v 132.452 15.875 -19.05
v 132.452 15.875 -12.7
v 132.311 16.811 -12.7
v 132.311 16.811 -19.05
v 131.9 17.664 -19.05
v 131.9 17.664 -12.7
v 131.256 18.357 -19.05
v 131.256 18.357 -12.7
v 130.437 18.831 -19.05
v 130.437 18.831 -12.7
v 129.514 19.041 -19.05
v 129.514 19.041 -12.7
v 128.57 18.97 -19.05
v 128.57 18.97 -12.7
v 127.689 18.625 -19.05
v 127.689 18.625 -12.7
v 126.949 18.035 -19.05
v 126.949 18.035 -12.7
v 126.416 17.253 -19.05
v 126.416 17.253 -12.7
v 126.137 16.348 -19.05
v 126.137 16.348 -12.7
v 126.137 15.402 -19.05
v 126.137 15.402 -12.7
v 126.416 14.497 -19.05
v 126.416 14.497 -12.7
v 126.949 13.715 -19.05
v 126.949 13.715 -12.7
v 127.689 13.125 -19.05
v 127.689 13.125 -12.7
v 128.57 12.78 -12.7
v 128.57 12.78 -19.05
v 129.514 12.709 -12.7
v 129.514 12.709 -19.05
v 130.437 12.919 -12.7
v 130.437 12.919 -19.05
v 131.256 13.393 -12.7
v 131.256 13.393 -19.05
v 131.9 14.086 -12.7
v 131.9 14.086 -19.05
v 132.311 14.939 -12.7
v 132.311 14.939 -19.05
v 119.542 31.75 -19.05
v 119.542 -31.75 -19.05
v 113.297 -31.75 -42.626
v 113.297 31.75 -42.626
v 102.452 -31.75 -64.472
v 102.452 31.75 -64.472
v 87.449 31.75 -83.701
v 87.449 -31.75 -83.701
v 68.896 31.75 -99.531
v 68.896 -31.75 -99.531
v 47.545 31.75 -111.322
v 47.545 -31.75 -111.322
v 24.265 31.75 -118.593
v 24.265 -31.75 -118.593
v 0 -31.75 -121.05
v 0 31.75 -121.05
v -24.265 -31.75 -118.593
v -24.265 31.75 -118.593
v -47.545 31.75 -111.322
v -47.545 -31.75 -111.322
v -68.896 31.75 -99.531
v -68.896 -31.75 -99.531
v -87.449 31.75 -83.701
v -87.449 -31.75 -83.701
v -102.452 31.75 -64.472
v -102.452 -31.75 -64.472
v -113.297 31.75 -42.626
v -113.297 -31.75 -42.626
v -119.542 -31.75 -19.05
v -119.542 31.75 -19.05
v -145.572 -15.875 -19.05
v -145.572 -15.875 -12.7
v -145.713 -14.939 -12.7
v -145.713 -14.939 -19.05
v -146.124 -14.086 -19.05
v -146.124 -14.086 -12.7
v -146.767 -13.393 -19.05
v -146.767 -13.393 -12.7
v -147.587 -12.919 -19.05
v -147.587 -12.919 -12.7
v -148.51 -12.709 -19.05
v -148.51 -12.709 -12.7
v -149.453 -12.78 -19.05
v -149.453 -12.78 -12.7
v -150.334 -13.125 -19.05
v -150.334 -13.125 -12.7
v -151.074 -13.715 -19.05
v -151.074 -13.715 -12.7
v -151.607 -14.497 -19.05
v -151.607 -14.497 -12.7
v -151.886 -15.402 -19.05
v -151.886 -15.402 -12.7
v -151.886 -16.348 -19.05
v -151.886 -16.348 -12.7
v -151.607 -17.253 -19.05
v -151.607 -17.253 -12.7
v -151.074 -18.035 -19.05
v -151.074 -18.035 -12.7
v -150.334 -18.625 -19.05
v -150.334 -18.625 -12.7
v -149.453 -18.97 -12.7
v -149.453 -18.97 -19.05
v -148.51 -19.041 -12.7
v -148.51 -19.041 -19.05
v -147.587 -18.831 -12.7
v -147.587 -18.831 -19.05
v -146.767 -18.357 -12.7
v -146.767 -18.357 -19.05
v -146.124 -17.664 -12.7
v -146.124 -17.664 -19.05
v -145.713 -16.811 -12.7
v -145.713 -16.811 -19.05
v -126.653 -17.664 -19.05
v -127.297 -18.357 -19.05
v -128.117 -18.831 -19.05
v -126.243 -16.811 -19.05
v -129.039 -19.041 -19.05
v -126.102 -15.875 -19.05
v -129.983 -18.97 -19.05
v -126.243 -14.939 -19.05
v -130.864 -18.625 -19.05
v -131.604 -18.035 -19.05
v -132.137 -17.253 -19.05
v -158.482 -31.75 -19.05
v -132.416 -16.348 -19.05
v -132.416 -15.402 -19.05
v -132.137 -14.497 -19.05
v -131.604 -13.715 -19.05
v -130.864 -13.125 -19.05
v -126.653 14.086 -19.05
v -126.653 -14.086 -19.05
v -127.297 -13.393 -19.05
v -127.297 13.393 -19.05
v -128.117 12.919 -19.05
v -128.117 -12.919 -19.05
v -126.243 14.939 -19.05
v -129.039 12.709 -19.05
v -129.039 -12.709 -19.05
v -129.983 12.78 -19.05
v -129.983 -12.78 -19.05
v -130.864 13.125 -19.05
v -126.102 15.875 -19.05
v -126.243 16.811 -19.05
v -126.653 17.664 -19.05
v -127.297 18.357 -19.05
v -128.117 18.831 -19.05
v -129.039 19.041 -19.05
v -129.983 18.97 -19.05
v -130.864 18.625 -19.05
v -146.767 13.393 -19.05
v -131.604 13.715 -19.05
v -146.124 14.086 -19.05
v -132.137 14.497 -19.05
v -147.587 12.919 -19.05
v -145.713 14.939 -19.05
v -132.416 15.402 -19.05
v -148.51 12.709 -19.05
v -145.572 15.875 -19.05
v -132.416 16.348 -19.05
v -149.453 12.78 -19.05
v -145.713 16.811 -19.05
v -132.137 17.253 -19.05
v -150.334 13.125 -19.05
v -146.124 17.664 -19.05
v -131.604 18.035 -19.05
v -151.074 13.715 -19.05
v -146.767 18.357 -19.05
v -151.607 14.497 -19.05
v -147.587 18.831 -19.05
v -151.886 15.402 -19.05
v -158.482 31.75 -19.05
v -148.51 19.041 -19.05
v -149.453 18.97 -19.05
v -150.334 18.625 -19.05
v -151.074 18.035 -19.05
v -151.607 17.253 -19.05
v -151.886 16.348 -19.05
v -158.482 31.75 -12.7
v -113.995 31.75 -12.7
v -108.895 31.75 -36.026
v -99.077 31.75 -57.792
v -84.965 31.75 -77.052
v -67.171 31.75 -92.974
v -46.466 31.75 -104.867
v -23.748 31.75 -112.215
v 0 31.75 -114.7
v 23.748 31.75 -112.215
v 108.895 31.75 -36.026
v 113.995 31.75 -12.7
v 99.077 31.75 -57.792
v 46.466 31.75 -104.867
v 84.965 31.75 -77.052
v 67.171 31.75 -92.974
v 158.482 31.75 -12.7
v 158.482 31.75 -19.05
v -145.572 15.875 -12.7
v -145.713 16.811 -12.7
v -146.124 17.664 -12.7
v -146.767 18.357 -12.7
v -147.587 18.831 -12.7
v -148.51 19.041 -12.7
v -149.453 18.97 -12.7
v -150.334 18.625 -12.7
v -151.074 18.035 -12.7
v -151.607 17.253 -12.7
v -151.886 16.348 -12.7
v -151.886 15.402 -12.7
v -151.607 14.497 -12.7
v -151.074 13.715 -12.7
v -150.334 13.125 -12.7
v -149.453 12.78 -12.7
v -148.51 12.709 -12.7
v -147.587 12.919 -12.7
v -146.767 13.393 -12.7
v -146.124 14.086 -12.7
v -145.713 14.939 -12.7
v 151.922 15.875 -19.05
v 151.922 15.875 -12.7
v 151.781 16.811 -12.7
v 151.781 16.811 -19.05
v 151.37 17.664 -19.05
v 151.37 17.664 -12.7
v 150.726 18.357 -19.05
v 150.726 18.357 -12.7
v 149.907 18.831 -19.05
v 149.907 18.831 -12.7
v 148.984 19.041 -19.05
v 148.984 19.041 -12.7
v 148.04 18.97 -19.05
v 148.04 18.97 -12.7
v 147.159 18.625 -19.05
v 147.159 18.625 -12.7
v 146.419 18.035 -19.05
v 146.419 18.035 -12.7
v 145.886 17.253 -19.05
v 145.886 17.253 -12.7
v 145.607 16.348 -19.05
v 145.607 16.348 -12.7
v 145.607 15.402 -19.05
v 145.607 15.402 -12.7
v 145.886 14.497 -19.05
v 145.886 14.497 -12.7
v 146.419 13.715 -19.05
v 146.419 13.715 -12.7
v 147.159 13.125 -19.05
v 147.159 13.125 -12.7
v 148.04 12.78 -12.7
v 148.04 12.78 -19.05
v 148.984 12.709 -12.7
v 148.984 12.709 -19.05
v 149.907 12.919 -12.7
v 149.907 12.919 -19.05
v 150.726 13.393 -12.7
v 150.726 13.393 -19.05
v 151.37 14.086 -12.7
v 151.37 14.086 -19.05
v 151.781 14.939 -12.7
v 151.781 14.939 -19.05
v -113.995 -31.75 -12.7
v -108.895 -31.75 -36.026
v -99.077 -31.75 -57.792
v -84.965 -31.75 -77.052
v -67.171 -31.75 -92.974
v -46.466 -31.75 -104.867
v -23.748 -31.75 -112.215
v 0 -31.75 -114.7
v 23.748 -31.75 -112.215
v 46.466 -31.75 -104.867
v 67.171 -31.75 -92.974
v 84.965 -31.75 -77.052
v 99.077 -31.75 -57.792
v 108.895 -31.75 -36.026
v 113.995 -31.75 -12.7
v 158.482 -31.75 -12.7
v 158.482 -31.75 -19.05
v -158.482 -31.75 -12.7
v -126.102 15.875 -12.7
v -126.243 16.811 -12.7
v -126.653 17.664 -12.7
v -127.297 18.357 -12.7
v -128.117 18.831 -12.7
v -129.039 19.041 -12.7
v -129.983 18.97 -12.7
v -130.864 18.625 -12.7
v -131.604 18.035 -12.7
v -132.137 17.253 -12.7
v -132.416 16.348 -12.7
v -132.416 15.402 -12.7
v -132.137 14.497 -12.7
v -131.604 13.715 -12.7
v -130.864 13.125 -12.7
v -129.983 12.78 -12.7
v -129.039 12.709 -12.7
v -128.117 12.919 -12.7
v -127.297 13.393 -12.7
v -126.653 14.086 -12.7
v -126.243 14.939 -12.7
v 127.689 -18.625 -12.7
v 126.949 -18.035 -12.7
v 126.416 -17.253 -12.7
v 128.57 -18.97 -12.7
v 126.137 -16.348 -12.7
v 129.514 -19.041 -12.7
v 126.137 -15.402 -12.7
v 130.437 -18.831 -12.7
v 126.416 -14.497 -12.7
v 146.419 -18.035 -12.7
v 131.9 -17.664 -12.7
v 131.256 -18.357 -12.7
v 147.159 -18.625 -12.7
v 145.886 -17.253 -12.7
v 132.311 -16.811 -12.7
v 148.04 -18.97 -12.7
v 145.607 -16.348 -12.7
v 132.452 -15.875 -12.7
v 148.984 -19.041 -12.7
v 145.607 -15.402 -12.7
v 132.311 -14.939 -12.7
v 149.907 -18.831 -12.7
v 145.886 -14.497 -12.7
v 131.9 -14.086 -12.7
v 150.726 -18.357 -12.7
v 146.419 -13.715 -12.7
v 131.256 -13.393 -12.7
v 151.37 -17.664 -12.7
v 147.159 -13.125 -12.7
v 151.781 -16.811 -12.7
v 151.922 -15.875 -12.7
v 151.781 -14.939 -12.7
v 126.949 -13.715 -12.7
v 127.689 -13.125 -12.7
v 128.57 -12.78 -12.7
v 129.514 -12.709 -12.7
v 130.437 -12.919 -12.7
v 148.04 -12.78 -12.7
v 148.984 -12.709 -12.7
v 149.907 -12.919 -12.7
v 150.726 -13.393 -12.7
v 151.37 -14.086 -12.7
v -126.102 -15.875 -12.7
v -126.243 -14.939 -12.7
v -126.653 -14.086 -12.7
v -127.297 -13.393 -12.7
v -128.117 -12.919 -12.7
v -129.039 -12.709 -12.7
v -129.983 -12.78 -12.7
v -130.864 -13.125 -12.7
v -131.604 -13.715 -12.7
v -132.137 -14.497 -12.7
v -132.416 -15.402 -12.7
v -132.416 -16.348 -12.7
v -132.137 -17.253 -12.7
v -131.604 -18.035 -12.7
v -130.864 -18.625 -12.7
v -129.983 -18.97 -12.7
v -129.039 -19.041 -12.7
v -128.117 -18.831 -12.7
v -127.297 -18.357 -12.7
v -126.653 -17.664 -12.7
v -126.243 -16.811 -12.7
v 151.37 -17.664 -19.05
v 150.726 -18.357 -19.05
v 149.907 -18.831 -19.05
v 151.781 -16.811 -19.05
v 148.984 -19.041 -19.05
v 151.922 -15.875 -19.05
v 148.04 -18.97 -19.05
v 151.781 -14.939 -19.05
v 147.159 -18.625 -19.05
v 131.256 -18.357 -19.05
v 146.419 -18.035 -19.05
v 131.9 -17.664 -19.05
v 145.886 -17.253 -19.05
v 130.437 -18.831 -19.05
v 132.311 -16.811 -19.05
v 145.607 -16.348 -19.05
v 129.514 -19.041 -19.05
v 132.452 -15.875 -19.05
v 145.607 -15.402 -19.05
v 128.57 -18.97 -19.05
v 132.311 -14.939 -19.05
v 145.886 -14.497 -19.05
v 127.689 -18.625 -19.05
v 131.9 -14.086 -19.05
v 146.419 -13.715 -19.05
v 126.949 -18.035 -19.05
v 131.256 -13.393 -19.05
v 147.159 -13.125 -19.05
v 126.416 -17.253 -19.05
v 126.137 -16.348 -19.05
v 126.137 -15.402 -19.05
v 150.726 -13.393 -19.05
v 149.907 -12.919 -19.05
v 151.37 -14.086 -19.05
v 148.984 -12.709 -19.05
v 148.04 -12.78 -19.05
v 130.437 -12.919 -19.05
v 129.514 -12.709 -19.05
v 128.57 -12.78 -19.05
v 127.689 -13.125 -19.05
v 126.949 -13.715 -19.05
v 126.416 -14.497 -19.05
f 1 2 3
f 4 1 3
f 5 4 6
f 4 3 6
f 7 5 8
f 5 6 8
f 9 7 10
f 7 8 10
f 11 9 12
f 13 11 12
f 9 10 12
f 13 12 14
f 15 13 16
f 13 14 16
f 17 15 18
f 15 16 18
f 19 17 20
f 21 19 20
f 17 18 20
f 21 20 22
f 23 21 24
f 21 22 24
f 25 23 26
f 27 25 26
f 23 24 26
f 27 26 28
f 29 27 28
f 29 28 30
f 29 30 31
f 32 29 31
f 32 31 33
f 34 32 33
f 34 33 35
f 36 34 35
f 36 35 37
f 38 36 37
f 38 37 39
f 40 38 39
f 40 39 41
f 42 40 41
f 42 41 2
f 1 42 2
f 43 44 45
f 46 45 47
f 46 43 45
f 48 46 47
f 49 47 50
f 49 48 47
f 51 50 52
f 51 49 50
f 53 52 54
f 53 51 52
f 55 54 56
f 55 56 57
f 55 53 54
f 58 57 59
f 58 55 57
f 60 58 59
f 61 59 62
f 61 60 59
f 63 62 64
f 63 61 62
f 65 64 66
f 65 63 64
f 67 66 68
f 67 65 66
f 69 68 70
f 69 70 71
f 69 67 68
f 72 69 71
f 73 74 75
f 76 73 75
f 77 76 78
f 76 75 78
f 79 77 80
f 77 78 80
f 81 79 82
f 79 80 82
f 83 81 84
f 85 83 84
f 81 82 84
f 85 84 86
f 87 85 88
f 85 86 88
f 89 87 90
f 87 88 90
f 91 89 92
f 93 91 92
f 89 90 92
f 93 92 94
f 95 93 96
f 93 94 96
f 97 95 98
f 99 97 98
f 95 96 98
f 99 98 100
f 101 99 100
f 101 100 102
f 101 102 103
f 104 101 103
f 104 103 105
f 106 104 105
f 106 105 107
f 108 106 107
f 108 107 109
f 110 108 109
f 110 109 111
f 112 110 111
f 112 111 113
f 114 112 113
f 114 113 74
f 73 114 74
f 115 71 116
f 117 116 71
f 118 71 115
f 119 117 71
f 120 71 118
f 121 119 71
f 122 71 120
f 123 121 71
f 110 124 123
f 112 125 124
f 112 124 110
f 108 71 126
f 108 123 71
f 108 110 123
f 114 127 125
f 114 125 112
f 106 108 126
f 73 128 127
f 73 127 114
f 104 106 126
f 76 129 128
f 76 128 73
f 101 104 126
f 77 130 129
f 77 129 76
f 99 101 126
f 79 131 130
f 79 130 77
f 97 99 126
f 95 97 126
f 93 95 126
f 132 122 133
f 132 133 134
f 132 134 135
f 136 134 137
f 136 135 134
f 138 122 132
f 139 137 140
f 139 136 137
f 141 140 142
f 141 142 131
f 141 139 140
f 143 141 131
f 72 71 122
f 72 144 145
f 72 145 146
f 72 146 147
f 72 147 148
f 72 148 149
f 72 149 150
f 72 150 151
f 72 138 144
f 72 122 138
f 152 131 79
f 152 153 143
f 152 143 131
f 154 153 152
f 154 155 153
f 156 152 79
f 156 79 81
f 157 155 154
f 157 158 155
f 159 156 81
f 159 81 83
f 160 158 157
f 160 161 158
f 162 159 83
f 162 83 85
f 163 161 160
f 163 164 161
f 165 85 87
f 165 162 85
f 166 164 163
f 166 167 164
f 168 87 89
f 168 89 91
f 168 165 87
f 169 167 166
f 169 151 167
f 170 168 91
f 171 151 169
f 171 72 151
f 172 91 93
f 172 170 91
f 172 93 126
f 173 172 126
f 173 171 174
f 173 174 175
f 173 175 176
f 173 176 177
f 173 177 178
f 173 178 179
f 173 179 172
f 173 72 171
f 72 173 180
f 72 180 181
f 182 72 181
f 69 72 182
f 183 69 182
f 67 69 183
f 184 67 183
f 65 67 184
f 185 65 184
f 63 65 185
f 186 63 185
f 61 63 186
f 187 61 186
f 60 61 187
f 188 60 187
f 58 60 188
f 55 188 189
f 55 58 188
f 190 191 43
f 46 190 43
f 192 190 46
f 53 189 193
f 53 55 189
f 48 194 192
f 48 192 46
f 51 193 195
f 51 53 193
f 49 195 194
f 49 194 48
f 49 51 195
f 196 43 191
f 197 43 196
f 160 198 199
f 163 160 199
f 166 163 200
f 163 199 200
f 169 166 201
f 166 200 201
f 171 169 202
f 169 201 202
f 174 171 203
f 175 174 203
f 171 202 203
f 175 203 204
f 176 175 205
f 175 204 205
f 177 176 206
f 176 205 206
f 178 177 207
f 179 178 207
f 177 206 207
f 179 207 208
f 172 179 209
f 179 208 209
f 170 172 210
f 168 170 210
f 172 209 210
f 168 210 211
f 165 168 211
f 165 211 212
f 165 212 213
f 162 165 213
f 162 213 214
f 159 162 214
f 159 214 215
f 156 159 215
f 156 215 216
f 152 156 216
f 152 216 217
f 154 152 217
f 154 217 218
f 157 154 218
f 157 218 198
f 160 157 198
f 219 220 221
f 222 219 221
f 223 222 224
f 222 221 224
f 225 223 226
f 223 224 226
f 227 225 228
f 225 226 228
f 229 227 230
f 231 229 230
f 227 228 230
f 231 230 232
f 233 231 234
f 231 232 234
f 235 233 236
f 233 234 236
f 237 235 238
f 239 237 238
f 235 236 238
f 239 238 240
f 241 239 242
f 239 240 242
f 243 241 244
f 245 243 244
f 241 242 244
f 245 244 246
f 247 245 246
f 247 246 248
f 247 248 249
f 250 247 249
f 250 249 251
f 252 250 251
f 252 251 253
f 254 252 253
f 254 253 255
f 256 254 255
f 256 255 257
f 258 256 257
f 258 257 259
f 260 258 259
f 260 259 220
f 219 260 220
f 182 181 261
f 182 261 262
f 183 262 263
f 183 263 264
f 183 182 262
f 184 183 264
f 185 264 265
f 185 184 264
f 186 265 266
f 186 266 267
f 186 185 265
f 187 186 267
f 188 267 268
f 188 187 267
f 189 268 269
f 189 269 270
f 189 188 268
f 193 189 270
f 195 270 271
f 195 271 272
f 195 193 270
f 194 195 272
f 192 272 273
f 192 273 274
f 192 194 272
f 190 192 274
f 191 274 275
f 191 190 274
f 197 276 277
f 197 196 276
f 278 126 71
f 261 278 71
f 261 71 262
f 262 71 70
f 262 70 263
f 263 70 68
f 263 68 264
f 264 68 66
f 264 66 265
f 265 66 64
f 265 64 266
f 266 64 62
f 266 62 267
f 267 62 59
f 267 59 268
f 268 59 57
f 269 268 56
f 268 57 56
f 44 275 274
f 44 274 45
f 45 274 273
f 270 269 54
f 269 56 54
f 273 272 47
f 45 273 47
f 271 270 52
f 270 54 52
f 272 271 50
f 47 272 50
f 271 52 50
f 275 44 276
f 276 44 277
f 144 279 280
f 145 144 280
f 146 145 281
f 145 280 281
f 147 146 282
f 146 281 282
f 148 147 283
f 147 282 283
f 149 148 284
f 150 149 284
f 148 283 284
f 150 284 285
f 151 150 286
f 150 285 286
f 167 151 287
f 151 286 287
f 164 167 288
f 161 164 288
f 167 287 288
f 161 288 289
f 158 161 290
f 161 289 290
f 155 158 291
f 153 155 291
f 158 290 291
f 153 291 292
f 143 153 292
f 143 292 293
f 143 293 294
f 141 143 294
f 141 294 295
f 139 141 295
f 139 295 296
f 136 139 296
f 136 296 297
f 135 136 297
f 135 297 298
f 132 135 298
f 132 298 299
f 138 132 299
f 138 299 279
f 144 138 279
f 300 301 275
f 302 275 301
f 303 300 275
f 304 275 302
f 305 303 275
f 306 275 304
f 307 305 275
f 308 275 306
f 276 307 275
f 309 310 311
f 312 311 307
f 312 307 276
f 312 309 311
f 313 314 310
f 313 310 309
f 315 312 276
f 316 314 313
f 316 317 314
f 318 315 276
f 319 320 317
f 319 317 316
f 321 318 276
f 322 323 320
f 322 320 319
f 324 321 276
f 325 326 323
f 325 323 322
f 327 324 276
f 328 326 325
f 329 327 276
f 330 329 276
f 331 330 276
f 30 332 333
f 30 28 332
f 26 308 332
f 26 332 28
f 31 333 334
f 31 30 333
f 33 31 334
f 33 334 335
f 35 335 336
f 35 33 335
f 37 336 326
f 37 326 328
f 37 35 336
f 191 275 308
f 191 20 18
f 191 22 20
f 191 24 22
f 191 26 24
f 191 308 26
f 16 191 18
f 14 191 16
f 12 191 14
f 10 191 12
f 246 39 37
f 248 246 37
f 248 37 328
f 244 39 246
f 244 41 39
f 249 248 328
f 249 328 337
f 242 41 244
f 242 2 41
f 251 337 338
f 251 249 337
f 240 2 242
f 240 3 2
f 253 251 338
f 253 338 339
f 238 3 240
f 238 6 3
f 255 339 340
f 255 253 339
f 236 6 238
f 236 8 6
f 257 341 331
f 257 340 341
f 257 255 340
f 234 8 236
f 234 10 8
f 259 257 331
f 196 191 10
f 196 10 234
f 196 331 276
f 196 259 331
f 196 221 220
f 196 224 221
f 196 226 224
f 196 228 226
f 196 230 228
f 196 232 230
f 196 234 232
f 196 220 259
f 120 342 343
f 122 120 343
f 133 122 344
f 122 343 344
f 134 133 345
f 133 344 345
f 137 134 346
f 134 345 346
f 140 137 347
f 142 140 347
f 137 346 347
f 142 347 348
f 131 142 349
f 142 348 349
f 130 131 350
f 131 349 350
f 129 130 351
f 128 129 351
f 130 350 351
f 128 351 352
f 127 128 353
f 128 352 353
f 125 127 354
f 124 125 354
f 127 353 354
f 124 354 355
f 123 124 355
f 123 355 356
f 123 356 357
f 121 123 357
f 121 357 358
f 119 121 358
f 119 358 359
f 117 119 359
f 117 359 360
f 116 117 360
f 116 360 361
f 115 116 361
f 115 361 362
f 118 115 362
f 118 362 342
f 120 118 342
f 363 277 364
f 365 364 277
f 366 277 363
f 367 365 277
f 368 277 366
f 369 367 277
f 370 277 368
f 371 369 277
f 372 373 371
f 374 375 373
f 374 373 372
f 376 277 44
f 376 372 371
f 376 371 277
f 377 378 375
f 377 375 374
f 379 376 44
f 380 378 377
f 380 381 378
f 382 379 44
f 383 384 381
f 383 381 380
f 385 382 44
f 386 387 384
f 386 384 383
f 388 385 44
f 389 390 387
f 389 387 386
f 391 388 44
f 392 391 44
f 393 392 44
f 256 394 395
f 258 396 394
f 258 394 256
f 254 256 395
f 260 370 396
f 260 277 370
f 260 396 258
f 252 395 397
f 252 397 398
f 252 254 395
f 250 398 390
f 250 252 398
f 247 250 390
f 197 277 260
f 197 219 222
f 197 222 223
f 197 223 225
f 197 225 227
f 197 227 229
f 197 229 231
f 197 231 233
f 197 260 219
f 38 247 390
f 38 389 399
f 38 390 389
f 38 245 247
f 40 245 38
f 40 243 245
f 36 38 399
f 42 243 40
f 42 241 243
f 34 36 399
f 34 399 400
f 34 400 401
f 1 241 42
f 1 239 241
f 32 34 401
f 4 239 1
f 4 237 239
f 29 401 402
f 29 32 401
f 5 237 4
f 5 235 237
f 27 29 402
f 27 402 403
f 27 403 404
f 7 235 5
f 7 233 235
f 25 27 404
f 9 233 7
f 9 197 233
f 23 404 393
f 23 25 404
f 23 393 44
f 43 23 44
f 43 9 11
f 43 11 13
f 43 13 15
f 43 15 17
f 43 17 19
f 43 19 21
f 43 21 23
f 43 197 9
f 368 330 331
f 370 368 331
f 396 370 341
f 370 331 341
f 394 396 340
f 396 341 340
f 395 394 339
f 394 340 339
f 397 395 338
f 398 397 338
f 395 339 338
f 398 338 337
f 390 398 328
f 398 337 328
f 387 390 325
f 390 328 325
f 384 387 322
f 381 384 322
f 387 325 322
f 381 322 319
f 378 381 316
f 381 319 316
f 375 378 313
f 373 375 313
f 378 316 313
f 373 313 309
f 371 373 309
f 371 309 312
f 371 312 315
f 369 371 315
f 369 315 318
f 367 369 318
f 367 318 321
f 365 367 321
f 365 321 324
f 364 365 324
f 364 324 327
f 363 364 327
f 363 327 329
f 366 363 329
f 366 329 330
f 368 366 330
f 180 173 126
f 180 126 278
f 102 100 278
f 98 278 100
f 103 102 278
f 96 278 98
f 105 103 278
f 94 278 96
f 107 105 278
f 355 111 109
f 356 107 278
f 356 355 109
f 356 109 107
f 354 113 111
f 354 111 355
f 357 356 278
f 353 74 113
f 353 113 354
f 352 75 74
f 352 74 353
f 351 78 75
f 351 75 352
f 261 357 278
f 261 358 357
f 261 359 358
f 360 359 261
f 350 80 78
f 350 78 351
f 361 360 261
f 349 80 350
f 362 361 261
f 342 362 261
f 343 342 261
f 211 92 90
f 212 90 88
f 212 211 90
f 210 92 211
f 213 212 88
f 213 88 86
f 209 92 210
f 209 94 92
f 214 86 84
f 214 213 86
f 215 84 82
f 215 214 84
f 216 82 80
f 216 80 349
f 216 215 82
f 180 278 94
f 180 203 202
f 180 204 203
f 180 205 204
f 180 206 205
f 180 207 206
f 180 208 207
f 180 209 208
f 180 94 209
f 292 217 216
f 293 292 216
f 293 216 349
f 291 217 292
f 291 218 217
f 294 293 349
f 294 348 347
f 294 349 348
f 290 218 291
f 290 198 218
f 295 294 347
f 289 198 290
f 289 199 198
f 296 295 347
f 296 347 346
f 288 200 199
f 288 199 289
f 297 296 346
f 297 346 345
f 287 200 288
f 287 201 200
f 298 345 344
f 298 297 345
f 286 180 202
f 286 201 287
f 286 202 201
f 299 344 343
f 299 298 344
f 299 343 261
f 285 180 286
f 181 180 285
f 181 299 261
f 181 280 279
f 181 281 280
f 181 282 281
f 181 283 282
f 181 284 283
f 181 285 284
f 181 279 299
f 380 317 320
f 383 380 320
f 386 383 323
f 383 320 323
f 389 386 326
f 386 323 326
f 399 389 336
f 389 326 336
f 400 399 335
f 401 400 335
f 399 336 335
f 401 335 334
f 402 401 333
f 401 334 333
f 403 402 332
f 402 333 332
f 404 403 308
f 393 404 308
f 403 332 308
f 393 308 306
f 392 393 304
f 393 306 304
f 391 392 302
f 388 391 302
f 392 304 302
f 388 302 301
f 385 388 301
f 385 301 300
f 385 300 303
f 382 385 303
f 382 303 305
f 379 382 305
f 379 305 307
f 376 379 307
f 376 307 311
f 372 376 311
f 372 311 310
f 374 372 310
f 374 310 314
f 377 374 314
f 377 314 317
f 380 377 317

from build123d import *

# Parameters (mm, degrees)
BOSS_EXTRUDE1_DEPTH = 31.75
SKETCH2_R           = 3.175
CUT_EXTRUDE1_DEPTH  = 195.587542385


with BuildPart() as part:
    # Sketch1 → Boss-Extrude1 (new, symmetric)
    with BuildSketch(Plane(origin=(0, 0, 0), x_dir=(1, 0, 0), z_dir=(0, 1, 0))):
        with BuildLine():
            ThreePointArc((119.54162455, 19.05), (0, 121.05), (-119.54162455, 19.05))
            Line((-119.54162455, 19.05), (-158.481944244, 19.05))
            Line((-158.481944244, 19.05), (-158.481944244, 12.7))
            Line((-158.481944244, 12.7), (-120.381944244, 12.7))
            Line((-120.381944244, 12.7), (-113.994736721, 12.7))
            ThreePointArc((-113.994736721, 12.7), (0, 114.7), (113.994736721, 12.7))
            Line((113.994736721, 12.7), (120.381944244, 12.7))
            Line((120.381944244, 12.7), (158.481944244, 12.7))
            Line((158.481944244, 12.7), (158.481944244, 19.05))
            Line((158.481944244, 19.05), (119.54162455, 19.05))
        make_face()
    extrude(amount=BOSS_EXTRUDE1_DEPTH, both=True)

    # Sketch2 → Cut-Extrude1 (cut, through all)
    with BuildSketch(Plane.XY.offset(-12.7)):
        with Locations((-129.276704473, 15.875)):
            Circle(SKETCH2_R)
        with Locations((-148.746864321, 15.875)):
            Circle(SKETCH2_R)
        with Locations((-148.746864321, -15.875)):
            Circle(SKETCH2_R)
        with Locations((-129.276704473, -15.875)):
            Circle(SKETCH2_R)
        with Locations((129.276704473, 15.875)):
            Circle(SKETCH2_R)
        with Locations((148.746864321, 15.875)):
            Circle(SKETCH2_R)
        with Locations((129.276704473, -15.875)):
            Circle(SKETCH2_R)
        with Locations((148.746864321, -15.875)):
            Circle(SKETCH2_R)
    extrude(amount=-CUT_EXTRUDE1_DEPTH, mode=Mode.SUBTRACT)


solid = part.part
